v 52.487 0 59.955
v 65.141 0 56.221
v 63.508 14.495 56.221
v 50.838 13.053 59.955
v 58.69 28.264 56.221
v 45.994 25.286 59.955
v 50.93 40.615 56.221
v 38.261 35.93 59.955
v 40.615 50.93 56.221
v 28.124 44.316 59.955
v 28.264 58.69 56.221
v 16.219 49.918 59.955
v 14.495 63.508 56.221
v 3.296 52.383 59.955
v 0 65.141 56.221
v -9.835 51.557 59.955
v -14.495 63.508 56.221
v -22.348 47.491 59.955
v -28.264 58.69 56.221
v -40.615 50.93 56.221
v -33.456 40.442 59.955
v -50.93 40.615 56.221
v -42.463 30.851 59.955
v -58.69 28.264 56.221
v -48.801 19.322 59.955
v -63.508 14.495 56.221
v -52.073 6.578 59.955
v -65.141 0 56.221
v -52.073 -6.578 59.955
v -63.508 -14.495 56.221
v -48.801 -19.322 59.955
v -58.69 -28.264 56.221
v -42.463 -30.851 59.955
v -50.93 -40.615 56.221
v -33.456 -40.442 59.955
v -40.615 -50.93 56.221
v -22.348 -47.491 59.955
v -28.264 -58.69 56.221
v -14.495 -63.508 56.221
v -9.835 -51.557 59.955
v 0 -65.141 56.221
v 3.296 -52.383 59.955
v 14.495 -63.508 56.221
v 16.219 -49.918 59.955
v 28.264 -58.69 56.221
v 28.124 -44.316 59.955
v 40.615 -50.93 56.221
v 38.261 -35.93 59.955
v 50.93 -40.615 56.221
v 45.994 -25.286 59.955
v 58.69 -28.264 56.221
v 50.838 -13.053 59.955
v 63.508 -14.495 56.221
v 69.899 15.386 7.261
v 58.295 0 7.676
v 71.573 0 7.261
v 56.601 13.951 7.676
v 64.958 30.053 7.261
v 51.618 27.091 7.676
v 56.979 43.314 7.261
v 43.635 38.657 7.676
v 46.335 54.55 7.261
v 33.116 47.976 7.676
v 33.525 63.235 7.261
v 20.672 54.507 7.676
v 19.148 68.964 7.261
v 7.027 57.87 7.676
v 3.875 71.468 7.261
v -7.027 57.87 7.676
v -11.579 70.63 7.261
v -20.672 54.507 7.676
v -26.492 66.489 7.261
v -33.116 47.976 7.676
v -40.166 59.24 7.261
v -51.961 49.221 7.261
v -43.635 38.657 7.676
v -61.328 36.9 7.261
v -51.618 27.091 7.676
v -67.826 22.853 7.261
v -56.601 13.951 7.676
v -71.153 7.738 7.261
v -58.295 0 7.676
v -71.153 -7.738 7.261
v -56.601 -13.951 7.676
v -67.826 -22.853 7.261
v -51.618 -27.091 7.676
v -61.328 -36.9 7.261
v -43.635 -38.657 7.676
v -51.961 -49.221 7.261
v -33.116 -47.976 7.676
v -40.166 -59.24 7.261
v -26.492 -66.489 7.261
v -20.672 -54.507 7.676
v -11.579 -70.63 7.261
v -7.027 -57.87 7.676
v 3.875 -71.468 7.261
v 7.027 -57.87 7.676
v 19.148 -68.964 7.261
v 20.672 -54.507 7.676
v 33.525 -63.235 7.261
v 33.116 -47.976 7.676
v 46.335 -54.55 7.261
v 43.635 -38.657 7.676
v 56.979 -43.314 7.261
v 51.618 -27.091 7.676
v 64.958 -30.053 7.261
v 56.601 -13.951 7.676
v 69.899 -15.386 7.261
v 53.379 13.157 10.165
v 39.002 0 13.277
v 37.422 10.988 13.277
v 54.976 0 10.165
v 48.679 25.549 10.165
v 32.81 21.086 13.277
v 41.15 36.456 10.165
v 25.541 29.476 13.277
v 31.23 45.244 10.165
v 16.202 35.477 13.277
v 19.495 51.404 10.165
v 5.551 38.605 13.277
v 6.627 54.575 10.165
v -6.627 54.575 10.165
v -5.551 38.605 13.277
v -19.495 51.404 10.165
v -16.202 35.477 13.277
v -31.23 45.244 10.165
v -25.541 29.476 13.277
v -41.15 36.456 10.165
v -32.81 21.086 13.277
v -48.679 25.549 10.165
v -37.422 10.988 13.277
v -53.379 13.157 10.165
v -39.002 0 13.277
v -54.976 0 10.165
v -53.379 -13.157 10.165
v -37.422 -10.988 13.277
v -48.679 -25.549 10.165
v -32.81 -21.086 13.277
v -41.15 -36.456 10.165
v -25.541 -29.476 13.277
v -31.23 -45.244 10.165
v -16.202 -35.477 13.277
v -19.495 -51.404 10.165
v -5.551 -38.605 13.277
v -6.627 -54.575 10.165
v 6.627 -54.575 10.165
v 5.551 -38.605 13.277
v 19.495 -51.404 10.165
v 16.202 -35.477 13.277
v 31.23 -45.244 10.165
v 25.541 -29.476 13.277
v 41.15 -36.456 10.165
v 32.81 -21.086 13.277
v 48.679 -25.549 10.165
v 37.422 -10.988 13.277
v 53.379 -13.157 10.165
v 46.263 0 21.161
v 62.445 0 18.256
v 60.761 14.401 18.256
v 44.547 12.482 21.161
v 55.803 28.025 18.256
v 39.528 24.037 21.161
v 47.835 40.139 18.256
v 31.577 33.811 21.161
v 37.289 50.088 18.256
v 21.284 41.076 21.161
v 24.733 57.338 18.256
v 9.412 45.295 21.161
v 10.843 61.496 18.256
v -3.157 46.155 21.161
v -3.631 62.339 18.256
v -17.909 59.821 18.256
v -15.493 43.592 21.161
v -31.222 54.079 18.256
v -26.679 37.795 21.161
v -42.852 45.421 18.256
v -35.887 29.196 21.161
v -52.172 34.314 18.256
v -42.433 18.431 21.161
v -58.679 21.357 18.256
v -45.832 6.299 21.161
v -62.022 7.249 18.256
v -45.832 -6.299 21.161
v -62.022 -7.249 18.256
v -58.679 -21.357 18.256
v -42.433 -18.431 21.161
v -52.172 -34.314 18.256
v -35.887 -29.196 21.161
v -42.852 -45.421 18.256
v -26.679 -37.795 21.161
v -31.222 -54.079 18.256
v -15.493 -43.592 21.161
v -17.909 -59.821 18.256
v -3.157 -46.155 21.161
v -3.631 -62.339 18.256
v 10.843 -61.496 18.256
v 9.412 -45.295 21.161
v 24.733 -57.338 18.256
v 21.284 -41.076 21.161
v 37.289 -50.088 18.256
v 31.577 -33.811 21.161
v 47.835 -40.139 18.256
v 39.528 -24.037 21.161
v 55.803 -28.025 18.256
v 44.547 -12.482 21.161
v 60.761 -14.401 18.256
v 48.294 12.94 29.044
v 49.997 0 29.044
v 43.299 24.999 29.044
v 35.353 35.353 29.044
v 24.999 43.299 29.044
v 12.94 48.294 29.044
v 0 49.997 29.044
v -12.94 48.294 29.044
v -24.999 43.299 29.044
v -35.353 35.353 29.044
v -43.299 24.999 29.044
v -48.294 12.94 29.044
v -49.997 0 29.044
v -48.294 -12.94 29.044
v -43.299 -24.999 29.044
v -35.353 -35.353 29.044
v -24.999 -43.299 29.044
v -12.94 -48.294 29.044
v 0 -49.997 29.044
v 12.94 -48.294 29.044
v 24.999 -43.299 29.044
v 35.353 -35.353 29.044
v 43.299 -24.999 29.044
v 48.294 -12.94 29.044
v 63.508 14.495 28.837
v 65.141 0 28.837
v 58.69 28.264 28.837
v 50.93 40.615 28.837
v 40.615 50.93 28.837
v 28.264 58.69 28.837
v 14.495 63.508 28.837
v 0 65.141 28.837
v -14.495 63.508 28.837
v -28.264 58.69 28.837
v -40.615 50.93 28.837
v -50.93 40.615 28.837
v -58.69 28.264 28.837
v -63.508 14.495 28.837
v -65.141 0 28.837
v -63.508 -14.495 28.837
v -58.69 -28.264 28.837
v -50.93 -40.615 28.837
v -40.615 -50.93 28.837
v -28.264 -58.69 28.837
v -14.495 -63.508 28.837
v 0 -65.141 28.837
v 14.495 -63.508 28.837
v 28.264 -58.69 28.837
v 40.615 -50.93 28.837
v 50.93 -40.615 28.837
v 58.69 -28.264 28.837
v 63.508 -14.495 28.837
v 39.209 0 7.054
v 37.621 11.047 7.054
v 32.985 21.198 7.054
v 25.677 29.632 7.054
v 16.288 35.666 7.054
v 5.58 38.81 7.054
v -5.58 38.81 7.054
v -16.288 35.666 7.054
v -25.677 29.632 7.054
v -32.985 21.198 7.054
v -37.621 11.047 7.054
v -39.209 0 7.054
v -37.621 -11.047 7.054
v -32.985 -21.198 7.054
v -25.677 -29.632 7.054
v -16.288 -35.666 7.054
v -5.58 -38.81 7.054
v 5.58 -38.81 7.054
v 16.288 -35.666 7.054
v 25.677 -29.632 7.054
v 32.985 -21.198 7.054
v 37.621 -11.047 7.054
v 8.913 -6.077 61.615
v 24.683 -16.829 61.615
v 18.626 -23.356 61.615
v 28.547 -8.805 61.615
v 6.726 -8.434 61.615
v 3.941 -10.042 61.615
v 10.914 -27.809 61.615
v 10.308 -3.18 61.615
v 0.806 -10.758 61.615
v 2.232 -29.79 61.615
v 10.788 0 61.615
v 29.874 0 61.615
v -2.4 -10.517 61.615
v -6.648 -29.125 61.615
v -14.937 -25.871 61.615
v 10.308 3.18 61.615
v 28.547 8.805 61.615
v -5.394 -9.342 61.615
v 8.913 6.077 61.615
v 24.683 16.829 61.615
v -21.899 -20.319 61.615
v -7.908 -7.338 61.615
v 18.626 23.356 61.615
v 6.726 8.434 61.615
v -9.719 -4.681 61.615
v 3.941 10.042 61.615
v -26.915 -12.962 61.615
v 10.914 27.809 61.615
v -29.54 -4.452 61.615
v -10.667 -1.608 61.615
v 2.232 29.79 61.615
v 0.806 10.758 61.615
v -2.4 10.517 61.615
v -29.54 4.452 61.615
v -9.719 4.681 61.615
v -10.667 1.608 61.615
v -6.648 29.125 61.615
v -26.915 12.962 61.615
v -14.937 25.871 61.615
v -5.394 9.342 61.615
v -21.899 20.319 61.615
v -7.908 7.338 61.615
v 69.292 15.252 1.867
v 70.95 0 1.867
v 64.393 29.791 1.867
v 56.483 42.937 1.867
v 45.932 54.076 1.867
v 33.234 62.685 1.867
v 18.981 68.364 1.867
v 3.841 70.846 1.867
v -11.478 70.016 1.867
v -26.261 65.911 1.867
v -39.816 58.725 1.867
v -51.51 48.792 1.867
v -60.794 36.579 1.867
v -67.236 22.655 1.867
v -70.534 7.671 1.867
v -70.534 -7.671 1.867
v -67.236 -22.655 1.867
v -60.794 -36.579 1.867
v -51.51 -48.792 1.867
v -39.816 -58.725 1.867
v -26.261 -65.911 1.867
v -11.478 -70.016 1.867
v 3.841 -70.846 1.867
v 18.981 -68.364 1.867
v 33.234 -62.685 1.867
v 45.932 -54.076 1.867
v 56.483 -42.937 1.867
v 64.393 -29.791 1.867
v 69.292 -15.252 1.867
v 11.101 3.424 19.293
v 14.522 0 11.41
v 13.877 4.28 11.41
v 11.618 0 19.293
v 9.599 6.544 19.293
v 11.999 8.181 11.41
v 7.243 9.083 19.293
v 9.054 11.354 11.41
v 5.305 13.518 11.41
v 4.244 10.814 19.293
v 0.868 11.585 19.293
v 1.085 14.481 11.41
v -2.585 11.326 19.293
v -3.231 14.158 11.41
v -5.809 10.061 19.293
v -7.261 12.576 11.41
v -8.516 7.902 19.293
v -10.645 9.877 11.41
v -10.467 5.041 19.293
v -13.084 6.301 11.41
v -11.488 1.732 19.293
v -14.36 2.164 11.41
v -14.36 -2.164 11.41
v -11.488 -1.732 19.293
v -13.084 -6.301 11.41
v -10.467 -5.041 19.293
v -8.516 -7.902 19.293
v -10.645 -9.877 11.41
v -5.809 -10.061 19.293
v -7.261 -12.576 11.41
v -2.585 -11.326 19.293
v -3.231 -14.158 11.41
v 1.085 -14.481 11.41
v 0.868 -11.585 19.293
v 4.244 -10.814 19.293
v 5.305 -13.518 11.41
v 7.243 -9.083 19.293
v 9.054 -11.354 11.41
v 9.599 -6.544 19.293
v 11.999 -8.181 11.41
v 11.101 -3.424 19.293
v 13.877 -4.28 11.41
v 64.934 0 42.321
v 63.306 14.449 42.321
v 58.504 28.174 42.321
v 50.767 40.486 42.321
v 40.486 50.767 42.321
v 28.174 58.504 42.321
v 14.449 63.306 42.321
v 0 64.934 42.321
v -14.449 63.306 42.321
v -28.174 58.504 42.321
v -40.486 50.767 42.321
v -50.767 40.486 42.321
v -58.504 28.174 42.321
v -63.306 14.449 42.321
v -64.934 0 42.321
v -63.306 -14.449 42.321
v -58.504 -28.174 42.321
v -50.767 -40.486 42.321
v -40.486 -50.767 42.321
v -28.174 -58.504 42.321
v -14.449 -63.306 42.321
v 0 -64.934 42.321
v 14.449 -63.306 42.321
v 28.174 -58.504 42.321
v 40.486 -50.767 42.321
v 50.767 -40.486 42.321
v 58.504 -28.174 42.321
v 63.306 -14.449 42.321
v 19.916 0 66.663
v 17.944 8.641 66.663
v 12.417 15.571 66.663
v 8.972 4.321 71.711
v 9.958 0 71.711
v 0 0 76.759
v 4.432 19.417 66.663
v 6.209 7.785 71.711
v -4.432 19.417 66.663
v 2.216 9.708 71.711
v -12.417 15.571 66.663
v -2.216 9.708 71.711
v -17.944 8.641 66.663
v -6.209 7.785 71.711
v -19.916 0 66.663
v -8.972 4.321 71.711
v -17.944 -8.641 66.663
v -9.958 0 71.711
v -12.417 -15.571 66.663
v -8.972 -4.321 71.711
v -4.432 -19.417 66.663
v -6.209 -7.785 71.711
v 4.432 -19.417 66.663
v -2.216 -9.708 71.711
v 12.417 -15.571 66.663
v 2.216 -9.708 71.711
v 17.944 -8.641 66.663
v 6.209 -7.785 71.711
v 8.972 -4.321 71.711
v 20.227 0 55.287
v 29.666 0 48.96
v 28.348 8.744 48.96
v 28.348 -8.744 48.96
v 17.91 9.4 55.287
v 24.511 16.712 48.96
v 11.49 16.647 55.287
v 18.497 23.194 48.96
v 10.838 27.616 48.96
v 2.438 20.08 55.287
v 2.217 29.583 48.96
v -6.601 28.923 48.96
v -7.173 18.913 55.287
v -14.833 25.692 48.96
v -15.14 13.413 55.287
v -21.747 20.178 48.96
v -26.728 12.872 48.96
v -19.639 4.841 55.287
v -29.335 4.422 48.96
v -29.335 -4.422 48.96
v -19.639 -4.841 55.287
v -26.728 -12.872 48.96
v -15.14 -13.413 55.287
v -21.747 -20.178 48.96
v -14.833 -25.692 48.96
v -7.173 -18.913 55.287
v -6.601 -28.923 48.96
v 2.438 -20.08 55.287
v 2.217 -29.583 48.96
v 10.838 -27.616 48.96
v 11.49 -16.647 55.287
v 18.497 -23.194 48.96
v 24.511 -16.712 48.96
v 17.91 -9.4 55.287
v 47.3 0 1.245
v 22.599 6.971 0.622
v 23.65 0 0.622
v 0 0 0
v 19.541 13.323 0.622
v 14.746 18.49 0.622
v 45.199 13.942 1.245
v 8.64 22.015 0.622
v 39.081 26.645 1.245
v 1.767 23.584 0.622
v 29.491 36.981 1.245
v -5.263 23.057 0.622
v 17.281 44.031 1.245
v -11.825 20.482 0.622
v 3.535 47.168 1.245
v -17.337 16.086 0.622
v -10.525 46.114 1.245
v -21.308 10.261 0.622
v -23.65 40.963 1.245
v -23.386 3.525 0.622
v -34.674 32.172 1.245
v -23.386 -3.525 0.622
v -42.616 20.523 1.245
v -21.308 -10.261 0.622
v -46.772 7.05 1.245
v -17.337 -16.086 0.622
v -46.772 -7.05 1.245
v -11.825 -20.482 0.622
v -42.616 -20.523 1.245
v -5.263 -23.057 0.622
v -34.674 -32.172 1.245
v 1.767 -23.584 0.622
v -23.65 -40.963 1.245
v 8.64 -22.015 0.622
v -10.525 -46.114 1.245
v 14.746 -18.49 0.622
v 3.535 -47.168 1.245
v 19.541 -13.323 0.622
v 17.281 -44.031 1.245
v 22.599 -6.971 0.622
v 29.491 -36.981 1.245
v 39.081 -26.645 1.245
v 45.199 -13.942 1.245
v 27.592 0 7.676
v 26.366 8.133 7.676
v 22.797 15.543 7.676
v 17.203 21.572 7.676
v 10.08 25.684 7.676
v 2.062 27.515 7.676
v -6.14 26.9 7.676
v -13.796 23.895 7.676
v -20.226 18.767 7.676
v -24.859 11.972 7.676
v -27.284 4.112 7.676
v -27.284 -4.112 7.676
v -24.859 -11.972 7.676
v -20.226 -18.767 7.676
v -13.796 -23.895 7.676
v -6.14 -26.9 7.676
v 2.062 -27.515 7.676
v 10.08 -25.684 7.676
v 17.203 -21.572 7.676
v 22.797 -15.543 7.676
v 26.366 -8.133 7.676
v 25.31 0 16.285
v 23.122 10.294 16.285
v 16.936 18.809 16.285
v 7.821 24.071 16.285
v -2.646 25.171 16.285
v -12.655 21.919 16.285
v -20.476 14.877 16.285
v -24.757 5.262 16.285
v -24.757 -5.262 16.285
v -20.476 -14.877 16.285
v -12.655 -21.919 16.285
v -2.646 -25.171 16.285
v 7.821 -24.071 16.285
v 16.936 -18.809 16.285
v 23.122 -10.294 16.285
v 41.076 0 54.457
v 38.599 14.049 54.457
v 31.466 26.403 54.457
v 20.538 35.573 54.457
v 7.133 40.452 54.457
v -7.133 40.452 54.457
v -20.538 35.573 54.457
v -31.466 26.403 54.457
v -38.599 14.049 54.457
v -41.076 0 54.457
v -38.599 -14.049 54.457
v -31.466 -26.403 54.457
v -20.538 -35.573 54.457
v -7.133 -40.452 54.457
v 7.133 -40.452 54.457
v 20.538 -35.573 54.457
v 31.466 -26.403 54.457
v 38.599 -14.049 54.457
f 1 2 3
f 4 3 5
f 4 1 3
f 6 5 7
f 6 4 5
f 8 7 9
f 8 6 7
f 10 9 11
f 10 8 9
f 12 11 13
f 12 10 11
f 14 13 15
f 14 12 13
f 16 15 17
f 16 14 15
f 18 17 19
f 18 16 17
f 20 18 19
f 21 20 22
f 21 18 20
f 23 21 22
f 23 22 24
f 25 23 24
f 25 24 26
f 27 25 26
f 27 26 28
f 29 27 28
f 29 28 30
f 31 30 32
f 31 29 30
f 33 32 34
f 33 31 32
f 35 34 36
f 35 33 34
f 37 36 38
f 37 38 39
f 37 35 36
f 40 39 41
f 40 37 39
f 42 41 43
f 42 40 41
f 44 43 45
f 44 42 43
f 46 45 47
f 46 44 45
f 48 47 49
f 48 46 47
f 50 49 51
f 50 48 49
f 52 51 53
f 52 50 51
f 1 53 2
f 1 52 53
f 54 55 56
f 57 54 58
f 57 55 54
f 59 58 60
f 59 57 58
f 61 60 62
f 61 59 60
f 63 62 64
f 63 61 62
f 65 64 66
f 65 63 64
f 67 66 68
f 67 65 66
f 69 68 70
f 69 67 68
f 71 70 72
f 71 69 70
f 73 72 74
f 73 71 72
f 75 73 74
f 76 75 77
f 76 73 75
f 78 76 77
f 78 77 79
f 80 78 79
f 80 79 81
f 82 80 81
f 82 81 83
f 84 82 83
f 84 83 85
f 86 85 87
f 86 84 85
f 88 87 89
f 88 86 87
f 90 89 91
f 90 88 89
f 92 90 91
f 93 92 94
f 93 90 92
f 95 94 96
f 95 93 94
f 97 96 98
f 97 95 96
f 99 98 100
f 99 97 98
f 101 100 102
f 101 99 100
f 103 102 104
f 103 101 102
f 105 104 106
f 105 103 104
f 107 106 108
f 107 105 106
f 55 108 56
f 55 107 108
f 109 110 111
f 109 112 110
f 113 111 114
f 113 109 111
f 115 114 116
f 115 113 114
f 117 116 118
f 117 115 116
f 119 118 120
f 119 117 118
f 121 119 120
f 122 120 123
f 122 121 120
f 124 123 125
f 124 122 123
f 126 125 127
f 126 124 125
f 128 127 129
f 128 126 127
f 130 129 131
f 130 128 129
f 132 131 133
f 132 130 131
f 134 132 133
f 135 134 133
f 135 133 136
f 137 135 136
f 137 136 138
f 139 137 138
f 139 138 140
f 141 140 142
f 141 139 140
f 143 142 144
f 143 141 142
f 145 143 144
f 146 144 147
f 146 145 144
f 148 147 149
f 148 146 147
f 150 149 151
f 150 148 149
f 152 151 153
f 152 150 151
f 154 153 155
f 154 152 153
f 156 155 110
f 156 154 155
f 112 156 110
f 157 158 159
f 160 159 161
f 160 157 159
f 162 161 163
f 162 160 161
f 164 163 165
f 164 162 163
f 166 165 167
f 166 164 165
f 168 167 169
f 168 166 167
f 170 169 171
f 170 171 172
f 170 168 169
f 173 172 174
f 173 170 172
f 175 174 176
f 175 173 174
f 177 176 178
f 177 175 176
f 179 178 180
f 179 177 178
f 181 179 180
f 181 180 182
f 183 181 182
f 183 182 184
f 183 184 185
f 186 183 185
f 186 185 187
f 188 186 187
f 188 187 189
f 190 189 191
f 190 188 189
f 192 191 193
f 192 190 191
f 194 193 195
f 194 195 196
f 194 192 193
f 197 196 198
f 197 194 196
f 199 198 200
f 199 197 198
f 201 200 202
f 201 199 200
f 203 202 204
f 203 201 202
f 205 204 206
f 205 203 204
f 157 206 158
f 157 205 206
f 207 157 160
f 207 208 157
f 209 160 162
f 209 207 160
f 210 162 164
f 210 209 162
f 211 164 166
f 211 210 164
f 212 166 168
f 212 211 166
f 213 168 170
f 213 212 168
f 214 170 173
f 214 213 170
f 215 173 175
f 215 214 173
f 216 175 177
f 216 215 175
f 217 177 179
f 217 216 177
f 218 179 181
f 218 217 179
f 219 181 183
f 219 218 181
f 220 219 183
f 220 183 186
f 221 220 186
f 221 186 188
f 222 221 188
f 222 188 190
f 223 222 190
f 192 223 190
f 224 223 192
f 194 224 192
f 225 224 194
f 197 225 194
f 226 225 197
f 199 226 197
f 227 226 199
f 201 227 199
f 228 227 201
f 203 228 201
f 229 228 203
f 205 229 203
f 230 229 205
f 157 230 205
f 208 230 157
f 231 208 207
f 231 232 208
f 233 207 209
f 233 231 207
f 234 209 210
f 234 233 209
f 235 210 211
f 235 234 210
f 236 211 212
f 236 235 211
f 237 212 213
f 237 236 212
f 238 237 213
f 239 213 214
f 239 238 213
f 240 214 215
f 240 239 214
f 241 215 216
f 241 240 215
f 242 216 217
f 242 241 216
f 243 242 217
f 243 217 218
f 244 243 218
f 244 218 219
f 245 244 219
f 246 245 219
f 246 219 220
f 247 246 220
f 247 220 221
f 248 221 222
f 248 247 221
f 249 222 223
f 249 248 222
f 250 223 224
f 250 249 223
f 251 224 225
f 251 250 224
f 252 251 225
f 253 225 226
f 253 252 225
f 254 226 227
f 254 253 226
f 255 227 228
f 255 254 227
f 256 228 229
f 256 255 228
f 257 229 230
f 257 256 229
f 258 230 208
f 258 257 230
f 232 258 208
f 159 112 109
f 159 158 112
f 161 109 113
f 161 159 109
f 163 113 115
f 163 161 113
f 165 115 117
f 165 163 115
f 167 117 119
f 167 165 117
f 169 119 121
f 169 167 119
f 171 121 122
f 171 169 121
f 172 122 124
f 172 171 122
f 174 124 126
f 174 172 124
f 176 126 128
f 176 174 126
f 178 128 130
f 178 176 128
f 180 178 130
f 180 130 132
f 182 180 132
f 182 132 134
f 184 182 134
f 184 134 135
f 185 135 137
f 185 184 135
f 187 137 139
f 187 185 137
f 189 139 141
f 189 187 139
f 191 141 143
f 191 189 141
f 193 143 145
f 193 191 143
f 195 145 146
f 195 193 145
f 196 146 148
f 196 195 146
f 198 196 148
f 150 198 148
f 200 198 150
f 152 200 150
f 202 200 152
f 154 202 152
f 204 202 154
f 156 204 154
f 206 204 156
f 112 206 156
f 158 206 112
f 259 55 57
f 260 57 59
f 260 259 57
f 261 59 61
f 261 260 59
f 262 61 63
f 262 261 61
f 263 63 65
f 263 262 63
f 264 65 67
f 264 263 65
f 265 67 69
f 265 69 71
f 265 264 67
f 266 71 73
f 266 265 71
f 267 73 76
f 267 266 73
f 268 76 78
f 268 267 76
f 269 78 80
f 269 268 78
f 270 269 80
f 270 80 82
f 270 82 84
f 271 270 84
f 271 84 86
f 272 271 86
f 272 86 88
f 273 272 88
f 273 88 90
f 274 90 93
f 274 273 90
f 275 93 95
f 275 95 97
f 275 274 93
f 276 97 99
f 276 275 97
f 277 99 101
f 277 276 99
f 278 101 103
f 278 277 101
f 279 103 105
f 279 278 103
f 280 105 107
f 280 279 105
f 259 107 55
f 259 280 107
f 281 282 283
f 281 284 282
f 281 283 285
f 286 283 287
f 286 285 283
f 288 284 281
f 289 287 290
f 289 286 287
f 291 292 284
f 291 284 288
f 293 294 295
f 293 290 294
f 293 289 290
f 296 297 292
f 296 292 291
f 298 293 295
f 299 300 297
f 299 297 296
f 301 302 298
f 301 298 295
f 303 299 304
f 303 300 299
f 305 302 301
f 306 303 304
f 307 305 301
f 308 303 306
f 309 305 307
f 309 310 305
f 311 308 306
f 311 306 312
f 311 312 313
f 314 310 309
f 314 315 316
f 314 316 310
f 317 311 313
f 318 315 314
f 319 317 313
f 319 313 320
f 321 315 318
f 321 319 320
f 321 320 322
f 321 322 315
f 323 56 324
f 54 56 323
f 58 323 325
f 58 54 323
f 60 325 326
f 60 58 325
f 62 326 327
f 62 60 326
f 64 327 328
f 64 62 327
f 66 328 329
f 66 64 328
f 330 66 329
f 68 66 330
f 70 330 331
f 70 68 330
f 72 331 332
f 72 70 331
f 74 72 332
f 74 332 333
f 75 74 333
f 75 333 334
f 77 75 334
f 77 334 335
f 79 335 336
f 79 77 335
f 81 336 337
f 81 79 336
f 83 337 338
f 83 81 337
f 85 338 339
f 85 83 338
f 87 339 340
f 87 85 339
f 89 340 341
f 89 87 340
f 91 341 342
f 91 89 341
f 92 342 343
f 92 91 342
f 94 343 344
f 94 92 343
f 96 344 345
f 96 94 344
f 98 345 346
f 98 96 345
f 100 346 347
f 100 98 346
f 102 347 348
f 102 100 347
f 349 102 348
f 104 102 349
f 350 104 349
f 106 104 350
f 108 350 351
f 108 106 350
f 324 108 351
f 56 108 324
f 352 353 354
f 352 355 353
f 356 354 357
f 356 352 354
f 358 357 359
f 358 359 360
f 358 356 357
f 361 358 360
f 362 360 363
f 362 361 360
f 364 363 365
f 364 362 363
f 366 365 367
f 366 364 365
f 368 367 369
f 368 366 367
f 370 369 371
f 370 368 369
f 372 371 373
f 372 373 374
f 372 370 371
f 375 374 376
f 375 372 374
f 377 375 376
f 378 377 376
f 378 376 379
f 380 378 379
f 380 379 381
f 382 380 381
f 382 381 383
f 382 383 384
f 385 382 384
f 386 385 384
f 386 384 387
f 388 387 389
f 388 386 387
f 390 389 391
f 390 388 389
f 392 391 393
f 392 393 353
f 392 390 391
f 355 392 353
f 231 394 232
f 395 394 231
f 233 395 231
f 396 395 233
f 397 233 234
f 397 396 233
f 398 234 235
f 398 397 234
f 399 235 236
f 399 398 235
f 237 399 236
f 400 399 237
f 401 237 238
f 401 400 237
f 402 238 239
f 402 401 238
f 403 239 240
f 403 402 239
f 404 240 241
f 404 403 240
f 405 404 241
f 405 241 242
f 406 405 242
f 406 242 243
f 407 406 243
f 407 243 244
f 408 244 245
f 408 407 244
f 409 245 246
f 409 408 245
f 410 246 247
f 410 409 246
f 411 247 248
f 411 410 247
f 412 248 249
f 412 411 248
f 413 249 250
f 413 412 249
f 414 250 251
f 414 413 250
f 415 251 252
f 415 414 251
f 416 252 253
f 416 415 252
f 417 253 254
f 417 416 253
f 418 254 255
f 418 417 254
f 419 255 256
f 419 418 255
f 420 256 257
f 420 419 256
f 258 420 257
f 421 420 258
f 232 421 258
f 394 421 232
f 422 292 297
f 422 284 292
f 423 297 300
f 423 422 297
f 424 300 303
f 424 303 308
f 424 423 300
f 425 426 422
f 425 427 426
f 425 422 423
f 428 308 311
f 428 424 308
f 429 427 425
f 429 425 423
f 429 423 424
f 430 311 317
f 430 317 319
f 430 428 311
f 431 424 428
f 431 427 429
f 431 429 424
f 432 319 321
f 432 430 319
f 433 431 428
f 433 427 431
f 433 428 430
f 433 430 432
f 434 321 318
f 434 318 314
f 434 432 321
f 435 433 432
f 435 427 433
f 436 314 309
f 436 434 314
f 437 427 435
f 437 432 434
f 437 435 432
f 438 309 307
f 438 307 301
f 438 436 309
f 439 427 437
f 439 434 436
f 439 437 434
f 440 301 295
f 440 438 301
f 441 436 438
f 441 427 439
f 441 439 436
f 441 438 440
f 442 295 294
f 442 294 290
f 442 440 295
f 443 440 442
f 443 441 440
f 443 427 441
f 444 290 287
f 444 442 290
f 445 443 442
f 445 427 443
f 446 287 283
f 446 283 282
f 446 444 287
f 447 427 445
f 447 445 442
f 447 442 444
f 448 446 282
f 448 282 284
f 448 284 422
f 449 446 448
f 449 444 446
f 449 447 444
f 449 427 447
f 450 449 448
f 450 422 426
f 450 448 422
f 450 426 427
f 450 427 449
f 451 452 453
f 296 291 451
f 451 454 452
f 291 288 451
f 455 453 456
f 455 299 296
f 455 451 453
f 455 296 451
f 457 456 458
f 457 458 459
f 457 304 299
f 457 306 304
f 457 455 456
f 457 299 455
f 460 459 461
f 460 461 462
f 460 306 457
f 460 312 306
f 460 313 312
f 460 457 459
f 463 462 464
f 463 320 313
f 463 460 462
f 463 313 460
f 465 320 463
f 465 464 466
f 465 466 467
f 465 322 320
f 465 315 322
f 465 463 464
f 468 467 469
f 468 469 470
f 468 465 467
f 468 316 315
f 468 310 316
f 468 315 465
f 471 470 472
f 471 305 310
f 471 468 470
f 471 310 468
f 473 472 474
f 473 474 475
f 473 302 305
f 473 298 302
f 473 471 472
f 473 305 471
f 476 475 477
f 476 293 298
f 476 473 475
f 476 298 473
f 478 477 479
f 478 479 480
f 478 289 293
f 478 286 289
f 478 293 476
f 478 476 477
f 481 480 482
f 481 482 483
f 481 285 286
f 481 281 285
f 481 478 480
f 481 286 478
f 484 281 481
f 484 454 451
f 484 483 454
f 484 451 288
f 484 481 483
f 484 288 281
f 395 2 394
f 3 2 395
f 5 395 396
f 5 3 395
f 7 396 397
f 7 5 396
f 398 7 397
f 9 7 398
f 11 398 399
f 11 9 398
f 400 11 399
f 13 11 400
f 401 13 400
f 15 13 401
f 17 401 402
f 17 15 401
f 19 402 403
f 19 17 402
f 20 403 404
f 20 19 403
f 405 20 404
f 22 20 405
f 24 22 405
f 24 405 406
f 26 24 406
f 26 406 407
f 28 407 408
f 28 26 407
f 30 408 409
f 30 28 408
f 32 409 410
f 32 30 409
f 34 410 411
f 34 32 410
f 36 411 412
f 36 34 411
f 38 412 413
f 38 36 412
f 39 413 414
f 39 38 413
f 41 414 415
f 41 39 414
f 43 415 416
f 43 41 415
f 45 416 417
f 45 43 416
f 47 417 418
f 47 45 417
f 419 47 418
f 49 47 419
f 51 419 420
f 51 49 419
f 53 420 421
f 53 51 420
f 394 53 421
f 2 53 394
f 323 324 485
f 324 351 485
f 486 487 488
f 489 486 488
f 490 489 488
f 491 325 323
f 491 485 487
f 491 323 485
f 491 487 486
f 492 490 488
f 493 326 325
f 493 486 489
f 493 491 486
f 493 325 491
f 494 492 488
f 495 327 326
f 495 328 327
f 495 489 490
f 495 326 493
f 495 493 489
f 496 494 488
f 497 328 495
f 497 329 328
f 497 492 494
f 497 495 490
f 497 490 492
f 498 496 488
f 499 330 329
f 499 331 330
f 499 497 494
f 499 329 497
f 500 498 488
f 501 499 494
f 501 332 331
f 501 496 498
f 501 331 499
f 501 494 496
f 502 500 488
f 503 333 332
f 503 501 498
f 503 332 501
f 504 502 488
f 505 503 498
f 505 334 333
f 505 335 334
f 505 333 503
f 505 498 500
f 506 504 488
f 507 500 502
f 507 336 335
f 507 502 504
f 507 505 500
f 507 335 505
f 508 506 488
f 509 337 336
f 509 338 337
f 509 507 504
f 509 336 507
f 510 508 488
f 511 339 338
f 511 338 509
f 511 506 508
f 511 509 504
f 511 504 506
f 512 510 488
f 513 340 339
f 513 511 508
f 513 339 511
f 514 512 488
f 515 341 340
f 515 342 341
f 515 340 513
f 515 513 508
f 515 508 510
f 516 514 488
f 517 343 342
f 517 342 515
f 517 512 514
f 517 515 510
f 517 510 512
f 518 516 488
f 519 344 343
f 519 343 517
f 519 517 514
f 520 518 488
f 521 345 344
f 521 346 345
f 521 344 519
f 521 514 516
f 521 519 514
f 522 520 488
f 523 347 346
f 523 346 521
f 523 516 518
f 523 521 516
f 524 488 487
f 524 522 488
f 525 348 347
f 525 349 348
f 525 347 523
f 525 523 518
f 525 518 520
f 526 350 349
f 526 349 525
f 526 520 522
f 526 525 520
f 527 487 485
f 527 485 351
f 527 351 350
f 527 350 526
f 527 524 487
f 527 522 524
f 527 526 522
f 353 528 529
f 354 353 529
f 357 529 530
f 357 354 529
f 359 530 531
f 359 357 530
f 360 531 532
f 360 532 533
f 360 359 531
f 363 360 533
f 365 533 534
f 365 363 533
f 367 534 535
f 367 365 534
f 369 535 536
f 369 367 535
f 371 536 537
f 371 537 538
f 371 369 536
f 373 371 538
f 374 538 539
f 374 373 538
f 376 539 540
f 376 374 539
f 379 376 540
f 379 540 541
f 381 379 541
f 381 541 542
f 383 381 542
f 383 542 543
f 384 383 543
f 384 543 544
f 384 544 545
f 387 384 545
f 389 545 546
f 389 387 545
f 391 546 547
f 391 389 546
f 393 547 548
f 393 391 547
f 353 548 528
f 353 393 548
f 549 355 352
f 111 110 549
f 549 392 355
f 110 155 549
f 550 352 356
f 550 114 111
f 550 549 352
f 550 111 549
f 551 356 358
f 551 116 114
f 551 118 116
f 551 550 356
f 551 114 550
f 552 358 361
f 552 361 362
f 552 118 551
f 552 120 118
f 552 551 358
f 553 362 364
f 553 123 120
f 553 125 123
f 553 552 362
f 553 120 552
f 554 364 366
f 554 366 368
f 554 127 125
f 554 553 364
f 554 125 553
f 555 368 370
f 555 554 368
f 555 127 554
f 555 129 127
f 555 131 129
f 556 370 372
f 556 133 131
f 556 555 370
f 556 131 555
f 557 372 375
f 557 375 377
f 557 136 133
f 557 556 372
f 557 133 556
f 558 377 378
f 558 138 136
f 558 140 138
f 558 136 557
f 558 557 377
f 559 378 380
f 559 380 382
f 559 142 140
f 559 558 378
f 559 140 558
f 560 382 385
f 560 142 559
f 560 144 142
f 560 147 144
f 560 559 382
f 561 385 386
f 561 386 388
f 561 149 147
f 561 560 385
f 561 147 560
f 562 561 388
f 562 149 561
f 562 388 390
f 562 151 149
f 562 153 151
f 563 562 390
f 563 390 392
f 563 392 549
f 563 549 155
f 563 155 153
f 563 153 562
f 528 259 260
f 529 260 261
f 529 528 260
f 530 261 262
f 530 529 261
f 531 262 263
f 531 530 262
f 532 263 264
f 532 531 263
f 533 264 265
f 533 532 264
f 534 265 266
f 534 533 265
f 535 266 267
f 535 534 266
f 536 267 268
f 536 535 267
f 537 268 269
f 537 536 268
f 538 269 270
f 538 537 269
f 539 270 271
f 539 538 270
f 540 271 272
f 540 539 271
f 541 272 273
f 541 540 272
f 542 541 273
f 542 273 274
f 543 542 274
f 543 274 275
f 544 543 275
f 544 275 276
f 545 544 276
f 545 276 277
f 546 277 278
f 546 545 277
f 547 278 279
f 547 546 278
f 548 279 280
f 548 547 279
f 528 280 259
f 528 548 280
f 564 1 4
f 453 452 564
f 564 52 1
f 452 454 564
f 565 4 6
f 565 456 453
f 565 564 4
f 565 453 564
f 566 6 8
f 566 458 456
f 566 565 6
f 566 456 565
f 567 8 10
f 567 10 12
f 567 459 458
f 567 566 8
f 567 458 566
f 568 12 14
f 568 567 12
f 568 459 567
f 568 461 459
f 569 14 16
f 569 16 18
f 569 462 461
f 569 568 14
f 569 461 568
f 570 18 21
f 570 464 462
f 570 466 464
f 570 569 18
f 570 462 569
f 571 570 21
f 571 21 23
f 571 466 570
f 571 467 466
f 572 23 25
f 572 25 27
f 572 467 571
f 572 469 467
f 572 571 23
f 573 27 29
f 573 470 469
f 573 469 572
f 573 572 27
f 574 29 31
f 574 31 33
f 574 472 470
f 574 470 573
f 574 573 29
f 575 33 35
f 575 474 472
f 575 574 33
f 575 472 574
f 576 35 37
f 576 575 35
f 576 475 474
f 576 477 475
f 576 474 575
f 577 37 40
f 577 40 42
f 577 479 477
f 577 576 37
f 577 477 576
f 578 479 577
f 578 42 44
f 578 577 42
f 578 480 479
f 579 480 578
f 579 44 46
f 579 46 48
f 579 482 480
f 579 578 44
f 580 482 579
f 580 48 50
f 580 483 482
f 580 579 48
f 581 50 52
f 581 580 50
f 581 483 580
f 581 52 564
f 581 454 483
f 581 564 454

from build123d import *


with BuildPart() as f1:
    # F0 (on Front) → F1 (revolve)
    with BuildSketch(Plane.XZ):
        Polygon((29.873788, 61.614744), (0, 76.759115), (0, 0), (70.9503, 1.867101), (71.572691, 7.260978), (58.295429, 7.675901), (39.209366, 7.053524), (27.591765, 7.675901), (14.521956, 11.410132), (11.617556, 19.293495), (39.001912, 13.277248), (54.976106, 10.165378), (62.444568, 18.25621), (46.26292, 21.16061), (49.997151, 29.04398), (65.141499, 28.836526), (64.934045, 42.321235), (65.141499, 56.220867), (52.486628, 59.95509), (29.666334, 48.959866), (10.787725, 61.614744), align=None)
    revolve(axis=Axis((0, 0, 38.379557), (0, 0, 1)))


solid = f1.part
